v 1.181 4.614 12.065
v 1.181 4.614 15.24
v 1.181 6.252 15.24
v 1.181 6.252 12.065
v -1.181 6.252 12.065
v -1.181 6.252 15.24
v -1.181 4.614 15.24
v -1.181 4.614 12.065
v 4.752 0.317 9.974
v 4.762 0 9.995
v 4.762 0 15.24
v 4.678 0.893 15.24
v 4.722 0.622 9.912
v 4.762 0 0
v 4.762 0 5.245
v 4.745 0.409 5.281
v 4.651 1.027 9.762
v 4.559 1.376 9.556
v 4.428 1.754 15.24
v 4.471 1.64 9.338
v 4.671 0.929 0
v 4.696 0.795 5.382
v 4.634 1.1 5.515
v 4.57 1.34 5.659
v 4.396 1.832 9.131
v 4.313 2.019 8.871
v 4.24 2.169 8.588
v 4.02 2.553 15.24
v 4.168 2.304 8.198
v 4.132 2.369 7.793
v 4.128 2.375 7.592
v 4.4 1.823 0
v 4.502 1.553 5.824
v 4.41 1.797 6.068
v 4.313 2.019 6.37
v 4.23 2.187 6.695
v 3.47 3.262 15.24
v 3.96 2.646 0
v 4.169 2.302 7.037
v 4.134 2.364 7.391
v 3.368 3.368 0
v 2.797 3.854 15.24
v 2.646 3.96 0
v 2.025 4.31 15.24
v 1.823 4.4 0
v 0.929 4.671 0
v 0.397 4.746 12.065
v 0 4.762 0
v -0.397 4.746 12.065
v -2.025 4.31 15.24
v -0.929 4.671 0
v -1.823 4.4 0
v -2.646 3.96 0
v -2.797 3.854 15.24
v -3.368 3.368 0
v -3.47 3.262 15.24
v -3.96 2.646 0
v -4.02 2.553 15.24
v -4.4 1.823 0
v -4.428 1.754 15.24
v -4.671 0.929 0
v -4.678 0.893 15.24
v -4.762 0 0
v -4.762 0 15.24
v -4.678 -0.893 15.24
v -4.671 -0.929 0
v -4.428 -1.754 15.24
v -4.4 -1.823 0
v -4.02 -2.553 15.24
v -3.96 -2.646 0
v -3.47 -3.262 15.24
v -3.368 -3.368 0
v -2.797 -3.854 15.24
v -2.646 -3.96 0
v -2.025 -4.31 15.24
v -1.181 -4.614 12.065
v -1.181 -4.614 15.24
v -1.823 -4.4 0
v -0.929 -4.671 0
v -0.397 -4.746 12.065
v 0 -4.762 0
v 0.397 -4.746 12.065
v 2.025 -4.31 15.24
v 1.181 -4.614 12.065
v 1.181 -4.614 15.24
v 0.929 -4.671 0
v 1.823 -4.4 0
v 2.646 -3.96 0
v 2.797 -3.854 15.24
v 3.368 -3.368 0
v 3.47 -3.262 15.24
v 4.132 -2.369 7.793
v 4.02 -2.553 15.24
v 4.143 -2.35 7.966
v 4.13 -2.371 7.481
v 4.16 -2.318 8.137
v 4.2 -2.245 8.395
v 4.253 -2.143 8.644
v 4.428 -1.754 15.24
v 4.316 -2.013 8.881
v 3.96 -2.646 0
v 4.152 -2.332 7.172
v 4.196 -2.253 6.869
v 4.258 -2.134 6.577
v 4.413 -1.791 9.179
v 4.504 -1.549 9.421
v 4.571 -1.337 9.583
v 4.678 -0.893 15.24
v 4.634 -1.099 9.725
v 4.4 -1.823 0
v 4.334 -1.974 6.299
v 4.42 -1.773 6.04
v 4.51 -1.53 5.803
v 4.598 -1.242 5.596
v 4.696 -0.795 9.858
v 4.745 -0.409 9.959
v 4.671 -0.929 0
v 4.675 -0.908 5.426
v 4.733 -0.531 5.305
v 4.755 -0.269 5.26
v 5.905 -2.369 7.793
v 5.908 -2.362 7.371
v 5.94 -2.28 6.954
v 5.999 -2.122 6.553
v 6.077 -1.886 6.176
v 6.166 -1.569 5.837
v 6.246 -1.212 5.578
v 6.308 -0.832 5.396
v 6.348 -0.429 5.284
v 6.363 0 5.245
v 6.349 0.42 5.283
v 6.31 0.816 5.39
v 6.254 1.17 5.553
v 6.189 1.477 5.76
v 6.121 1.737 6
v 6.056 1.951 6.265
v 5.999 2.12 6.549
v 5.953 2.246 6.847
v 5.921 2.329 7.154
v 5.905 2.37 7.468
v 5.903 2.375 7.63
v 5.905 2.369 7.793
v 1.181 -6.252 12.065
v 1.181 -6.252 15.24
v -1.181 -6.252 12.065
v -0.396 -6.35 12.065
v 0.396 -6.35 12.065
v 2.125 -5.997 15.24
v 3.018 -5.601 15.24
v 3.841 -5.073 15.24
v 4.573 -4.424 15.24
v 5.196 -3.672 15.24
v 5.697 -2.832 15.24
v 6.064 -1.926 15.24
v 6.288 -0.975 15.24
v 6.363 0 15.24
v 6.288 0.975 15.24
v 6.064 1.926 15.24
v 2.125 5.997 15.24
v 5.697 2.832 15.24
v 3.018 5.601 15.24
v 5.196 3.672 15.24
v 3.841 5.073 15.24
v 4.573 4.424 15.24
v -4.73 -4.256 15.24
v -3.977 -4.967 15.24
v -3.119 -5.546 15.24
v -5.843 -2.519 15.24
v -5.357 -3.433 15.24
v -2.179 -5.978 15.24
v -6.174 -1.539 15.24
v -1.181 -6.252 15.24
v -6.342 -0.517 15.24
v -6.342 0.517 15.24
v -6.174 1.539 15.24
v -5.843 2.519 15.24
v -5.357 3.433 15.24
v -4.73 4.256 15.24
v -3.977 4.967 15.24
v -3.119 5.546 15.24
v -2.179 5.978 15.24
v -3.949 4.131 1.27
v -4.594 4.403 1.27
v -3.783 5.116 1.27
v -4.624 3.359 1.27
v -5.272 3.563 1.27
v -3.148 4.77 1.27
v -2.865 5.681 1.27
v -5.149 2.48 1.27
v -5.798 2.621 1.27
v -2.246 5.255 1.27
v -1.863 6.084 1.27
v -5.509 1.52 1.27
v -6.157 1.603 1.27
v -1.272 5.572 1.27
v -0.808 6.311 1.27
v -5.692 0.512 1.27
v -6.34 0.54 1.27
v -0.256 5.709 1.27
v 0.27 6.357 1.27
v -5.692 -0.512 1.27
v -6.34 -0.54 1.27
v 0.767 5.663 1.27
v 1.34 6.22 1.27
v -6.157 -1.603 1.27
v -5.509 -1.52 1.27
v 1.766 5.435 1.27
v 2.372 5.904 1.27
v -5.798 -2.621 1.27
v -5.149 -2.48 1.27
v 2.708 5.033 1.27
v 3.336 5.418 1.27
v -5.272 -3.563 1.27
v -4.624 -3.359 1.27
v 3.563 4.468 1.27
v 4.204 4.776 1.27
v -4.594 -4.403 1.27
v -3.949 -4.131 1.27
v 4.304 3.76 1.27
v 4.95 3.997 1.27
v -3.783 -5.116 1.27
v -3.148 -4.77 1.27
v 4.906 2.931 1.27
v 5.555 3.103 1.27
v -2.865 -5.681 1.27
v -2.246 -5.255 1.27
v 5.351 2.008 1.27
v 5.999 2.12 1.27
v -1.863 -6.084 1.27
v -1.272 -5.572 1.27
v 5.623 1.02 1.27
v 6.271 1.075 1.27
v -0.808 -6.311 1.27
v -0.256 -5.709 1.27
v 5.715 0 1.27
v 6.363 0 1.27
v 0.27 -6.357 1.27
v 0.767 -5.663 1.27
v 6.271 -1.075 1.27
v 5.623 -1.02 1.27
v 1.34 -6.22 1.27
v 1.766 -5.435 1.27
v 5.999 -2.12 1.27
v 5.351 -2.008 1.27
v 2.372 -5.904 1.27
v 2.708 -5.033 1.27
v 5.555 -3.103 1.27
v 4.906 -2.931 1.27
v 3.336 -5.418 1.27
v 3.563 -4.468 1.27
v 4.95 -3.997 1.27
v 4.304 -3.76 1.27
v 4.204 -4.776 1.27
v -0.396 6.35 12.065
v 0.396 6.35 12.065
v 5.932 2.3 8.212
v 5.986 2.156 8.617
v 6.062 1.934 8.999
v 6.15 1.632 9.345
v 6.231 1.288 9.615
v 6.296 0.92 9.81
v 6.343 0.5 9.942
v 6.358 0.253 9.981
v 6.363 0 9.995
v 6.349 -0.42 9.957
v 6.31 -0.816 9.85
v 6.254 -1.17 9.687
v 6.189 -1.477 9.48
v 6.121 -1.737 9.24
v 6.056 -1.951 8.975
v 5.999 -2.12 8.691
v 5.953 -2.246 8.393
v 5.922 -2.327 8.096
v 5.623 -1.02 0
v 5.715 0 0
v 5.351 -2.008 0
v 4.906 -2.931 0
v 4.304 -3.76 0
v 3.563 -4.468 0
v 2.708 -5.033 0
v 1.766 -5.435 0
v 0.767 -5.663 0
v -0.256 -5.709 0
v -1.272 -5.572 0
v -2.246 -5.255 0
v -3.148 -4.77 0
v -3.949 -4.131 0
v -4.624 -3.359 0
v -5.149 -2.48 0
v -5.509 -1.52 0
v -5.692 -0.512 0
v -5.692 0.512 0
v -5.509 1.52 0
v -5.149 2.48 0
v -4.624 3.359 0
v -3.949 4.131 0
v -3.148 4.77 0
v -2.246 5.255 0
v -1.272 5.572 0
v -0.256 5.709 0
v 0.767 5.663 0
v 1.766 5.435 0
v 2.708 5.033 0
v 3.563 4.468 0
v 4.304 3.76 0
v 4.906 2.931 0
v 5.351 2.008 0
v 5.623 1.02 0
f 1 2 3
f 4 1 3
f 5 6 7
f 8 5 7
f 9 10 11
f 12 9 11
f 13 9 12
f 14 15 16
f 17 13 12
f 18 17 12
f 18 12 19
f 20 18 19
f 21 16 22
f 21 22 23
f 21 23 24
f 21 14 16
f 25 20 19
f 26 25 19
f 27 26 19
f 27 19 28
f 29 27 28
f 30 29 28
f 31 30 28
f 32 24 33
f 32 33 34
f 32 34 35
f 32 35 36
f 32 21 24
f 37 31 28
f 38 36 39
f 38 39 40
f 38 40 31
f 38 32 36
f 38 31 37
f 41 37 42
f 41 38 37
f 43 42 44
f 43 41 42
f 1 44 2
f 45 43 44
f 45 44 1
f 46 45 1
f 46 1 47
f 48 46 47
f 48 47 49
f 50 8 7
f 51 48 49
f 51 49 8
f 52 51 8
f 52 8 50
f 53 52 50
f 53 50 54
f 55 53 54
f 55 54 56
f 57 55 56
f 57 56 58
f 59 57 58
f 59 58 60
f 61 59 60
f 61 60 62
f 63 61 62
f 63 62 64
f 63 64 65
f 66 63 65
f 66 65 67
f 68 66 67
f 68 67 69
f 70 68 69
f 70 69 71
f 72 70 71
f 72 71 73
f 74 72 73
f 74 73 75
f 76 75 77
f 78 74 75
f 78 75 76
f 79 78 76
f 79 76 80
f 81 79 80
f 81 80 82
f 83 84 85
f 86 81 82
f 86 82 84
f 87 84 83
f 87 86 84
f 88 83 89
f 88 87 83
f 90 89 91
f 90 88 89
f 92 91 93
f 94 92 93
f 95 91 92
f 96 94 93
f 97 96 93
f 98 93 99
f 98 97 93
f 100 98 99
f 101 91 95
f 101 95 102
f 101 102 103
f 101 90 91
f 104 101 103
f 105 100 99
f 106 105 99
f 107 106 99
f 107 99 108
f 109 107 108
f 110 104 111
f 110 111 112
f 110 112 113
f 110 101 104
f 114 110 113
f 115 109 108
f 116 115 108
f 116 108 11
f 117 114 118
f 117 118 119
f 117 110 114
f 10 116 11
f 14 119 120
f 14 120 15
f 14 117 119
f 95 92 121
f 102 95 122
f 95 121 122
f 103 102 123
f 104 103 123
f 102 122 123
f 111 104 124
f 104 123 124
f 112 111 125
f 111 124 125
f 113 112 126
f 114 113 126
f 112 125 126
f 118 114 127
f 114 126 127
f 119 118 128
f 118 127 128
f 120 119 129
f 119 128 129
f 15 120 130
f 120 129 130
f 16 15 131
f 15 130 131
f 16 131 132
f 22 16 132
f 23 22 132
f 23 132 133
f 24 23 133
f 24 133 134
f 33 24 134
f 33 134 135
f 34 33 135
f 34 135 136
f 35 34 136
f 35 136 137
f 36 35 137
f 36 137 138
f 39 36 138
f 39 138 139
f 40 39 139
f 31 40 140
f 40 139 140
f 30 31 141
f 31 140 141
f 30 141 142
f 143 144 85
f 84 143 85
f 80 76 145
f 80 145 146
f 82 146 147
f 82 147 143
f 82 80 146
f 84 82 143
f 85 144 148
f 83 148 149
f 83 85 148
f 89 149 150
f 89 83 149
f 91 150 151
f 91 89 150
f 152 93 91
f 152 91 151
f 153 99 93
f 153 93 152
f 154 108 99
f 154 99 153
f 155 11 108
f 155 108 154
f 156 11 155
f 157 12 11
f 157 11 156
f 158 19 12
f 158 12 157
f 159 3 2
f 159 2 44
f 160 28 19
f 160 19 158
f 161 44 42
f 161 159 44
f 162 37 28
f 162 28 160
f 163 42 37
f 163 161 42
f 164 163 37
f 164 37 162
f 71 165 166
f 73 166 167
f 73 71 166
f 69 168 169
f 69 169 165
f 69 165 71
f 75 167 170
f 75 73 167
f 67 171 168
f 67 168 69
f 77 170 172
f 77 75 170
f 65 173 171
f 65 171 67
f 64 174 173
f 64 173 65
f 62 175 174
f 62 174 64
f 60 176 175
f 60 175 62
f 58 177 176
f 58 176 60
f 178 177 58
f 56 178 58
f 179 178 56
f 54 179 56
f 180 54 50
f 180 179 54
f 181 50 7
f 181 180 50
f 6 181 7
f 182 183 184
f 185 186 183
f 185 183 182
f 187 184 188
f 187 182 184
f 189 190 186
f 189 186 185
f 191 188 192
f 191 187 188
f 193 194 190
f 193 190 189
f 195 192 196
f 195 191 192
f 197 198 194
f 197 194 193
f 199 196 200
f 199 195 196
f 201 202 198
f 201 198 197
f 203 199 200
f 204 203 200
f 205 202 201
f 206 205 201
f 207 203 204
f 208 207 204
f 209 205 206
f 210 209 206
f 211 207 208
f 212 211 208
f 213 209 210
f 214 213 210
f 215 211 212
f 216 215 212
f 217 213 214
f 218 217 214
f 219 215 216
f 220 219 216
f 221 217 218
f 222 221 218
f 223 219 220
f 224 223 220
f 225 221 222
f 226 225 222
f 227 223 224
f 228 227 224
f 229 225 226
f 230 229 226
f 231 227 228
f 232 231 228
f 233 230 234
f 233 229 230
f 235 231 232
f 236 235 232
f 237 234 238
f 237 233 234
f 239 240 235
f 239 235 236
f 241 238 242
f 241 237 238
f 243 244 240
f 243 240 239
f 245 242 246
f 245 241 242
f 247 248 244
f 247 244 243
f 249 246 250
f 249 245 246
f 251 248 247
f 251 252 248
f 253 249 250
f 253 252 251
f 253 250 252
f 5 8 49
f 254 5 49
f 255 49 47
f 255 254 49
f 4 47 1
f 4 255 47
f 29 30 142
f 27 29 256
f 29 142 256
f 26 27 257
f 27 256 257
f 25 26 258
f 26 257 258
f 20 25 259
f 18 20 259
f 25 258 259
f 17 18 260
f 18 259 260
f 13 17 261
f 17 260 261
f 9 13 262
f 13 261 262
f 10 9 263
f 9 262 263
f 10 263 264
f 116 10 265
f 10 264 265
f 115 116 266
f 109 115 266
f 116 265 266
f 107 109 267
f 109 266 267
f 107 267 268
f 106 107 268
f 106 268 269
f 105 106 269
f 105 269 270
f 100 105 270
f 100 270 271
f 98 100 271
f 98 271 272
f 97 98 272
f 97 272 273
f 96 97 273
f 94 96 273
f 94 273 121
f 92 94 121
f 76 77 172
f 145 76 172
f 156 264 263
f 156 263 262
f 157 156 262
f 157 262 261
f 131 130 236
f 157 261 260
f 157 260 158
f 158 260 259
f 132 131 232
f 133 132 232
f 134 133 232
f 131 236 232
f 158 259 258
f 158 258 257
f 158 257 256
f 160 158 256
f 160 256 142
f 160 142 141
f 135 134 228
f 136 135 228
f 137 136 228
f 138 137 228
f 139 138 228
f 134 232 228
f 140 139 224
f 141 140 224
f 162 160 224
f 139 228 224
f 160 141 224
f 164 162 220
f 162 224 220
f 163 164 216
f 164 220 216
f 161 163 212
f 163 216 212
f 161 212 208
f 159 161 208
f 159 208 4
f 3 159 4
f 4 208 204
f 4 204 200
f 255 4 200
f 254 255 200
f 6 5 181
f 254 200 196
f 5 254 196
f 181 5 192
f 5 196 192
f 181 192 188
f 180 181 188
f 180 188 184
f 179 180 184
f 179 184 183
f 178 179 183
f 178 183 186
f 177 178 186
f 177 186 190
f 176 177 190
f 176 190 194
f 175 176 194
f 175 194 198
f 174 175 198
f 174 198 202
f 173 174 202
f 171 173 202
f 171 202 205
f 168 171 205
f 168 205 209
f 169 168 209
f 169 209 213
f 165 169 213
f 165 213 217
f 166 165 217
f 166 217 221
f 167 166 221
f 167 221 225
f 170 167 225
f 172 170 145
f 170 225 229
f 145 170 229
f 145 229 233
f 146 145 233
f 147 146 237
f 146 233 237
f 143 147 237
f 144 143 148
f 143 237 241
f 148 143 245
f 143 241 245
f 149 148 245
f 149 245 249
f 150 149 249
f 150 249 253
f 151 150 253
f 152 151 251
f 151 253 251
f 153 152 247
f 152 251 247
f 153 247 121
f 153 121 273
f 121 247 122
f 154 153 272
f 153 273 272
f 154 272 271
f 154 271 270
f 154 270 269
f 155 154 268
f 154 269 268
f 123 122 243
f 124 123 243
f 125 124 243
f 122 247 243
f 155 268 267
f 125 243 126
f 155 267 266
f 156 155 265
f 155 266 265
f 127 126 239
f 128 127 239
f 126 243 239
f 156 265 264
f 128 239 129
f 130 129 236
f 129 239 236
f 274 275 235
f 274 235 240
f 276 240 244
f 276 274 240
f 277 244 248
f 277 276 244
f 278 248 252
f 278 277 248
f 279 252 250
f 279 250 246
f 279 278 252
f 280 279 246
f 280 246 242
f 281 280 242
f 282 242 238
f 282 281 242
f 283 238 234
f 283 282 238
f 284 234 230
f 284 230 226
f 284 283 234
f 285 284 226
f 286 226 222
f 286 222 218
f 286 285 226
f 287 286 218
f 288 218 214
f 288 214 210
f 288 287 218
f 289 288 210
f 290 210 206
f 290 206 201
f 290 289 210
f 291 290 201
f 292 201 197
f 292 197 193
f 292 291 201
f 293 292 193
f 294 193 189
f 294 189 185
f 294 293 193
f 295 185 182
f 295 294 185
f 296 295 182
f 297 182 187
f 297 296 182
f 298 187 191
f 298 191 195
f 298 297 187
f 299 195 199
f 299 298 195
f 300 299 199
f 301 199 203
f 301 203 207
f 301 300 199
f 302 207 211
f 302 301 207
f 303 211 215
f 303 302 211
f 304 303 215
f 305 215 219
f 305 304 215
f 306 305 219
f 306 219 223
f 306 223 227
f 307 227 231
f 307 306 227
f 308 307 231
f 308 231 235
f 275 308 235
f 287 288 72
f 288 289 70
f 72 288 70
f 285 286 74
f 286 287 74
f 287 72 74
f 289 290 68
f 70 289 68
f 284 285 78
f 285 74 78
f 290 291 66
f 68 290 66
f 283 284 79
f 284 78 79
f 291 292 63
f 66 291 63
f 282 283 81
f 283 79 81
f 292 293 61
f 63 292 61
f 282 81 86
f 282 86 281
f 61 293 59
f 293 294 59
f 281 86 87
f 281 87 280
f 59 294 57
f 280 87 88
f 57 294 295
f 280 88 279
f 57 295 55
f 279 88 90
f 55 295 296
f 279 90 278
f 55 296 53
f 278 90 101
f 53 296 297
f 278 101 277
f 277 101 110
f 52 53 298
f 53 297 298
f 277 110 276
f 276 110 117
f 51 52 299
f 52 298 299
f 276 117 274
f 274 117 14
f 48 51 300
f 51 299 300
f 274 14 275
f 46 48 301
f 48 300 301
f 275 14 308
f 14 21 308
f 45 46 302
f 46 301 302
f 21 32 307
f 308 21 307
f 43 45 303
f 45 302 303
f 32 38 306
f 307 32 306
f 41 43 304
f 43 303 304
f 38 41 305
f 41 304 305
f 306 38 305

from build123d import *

# Parameters (mm, degrees)
F0_R     = 6.3627
F0_R_2   = 4.7625
F1_DEPTH = 15.24
F2_R     = 6.3627
F2_R_2   = 5.715
F3_DEPTH = 1.27
F6_DEPTH = 5.08
F8_DEPTH = 3.175


with BuildPart() as f1:
    # F0 (on Top) → F1 (new body)
    with BuildSketch(Plane.XY):
        Circle(F0_R)
        Circle(F0_R_2, mode=Mode.SUBTRACT)
    extrude(amount=F1_DEPTH)

    # F2 (on face) → F3 (cut)
    with BuildSketch(Plane(origin=(0, 0, 0), x_dir=(1, 0, 0), z_dir=(0, 0, -1))):
        Circle(F2_R)
        Circle(F2_R_2, mode=Mode.SUBTRACT)
    extrude(amount=-F3_DEPTH, mode=Mode.SUBTRACT)

    # F5 (on offset) → F6 (cut)
    with BuildSketch(Plane.YZ.offset(7.9375)):
        with BuildLine():
            ThreePointArc((2.3685727212, 7.7932433957), (0, 9.9949), (-2.3685727212, 7.7932433957))
            ThreePointArc((-2.3685727212, 7.7932433957), (0, 5.2451), (2.3685727212, 7.7932433957))
        make_face()
    extrude(amount=-F6_DEPTH, mode=Mode.SUBTRACT)

    # F7 (on face) → F8 (cut)
    with BuildSketch(Plane.XY.offset(15.24)):
        with BuildLine():
            ThreePointArc((1.1811, 6.2521159682), (0, 6.3627), (-1.1811, 6.2521159682))
            Line((-1.1811, 6.2521159682), (-1.1811, 4.6137196534))
            ThreePointArc((-1.1811, 4.6137196534), (0, 4.7625), (1.1811, 4.6137196534))
            Line((1.1811, 4.6137196534), (1.1811, 6.2521159682))
        make_face()
        with BuildLine():
            Line((-1.1811, -4.6137196534), (-1.1811, -6.2521159682))
            ThreePointArc((-1.1811, -6.2521159682), (0, -6.3627), (1.1811, -6.2521159682))
            Line((1.1811, -6.2521159682), (1.1811, -4.6137196534))
            ThreePointArc((1.1811, -4.6137196534), (0, -4.7625), (-1.1811, -4.6137196534))
        make_face()
    extrude(amount=-F8_DEPTH, mode=Mode.SUBTRACT)


solid = f1.part
